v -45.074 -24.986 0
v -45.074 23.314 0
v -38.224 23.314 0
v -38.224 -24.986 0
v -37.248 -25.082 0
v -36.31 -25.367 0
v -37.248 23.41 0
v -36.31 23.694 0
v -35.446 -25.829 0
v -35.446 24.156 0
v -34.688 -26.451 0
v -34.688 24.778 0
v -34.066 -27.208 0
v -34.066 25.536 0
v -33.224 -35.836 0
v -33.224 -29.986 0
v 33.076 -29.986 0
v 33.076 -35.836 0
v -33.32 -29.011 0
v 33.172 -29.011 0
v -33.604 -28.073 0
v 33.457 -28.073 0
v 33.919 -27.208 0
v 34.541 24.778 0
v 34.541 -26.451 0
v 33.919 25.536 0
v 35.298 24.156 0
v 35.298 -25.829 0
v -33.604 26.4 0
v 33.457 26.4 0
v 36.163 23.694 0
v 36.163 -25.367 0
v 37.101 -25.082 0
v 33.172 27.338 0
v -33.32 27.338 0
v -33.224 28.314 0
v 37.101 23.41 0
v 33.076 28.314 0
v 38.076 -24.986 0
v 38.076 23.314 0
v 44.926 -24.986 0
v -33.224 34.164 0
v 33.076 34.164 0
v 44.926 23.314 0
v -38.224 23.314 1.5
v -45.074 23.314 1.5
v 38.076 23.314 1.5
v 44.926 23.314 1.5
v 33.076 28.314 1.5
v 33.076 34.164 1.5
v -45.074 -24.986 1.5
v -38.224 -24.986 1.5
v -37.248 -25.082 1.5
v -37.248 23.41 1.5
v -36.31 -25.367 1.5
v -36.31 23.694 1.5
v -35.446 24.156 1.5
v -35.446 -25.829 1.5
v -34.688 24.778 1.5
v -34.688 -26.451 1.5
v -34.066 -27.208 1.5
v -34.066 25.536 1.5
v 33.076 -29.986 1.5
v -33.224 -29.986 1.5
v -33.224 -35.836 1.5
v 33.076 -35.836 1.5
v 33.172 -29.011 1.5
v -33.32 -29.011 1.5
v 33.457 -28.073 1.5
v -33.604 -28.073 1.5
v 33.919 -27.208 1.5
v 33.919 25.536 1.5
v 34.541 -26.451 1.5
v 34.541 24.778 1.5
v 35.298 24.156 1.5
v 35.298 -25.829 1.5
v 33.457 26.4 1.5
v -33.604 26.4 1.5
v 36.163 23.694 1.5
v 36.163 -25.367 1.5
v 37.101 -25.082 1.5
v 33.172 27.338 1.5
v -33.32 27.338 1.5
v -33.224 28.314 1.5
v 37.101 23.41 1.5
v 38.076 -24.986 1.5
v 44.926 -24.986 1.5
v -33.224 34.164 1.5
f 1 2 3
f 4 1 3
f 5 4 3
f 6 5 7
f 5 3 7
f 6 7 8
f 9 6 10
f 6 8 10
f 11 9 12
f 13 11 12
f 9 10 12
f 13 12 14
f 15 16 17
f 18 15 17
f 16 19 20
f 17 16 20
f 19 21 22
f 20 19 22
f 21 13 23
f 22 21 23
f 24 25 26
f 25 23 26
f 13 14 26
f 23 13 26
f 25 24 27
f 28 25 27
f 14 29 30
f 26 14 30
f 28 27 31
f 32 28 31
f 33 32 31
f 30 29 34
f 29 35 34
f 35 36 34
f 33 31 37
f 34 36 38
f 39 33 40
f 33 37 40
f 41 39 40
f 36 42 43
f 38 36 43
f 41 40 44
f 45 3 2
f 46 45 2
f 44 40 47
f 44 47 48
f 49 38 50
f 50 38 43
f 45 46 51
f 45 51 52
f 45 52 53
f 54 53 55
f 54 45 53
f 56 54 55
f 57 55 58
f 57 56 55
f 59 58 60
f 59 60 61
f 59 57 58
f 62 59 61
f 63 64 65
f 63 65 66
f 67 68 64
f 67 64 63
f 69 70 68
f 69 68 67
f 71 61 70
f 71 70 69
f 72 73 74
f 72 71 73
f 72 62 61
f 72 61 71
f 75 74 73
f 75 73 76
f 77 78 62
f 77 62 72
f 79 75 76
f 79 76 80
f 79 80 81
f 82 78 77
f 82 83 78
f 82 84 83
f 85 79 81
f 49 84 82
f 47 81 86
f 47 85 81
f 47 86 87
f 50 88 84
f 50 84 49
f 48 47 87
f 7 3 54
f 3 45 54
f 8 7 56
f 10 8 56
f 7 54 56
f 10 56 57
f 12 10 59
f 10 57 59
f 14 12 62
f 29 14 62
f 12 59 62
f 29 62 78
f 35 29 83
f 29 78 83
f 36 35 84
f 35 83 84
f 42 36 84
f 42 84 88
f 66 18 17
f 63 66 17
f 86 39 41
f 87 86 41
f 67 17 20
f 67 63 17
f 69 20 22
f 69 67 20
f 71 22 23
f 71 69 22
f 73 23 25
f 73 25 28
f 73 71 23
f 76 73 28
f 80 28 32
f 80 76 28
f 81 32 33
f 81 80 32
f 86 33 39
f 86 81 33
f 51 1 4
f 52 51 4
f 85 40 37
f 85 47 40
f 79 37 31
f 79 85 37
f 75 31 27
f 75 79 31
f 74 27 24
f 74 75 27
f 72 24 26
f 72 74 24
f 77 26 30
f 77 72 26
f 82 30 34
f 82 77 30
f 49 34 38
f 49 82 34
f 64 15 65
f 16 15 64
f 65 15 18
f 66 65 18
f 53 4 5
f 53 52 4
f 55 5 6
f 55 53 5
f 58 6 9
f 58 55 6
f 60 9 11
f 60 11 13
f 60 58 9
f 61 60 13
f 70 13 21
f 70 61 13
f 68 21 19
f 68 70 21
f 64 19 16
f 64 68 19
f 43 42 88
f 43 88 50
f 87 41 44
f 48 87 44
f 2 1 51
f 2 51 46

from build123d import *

# Parameters (mm, degrees)
SKETCH_3_W      = 66.3
SKETCH_3_H      = 48.3
SKETCH_3_W_2    = 11.85
SKETCH_3_H_2    = 10.85
EXTRUDE_1_DEPTH = 1.5
FILLET_1_R      = 5


with BuildPart() as part:
    # 草图3 → 凸台-拉伸1 (new body)
    with BuildSketch(Plane.XY):
        with Locations((-0.073737011, -0.836272376)):
            Rectangle(SKETCH_3_W, SKETCH_3_H)
        with Locations((-39.148737011, -0.836272376)):
            Rectangle(SKETCH_3_W_2, SKETCH_3_H)
        with Locations((-0.073737011, -30.411272376)):
            Rectangle(SKETCH_3_W, SKETCH_3_H_2)
        with Locations((-0.073737011, 28.738727624)):
            Rectangle(SKETCH_3_W, SKETCH_3_H_2)
        with Locations((39.001262989, -0.836272376)):
            Rectangle(SKETCH_3_W_2, SKETCH_3_H)
    extrude(amount=EXTRUDE_1_DEPTH)

    # 圆角1
    fillet_1_edges = [part.edges().sort_by_distance(p)[0] for p in [
        (33.076262989, 23.313727624, 0.75),
        (33.076262989, -24.986272376, 0.75),
        (-33.223737011, -24.986272376, 0.75),
        (-33.223737011, 23.313727624, 0.75),
    ]]
    fillet(fillet_1_edges, radius=FILLET_1_R)


solid = part.part
